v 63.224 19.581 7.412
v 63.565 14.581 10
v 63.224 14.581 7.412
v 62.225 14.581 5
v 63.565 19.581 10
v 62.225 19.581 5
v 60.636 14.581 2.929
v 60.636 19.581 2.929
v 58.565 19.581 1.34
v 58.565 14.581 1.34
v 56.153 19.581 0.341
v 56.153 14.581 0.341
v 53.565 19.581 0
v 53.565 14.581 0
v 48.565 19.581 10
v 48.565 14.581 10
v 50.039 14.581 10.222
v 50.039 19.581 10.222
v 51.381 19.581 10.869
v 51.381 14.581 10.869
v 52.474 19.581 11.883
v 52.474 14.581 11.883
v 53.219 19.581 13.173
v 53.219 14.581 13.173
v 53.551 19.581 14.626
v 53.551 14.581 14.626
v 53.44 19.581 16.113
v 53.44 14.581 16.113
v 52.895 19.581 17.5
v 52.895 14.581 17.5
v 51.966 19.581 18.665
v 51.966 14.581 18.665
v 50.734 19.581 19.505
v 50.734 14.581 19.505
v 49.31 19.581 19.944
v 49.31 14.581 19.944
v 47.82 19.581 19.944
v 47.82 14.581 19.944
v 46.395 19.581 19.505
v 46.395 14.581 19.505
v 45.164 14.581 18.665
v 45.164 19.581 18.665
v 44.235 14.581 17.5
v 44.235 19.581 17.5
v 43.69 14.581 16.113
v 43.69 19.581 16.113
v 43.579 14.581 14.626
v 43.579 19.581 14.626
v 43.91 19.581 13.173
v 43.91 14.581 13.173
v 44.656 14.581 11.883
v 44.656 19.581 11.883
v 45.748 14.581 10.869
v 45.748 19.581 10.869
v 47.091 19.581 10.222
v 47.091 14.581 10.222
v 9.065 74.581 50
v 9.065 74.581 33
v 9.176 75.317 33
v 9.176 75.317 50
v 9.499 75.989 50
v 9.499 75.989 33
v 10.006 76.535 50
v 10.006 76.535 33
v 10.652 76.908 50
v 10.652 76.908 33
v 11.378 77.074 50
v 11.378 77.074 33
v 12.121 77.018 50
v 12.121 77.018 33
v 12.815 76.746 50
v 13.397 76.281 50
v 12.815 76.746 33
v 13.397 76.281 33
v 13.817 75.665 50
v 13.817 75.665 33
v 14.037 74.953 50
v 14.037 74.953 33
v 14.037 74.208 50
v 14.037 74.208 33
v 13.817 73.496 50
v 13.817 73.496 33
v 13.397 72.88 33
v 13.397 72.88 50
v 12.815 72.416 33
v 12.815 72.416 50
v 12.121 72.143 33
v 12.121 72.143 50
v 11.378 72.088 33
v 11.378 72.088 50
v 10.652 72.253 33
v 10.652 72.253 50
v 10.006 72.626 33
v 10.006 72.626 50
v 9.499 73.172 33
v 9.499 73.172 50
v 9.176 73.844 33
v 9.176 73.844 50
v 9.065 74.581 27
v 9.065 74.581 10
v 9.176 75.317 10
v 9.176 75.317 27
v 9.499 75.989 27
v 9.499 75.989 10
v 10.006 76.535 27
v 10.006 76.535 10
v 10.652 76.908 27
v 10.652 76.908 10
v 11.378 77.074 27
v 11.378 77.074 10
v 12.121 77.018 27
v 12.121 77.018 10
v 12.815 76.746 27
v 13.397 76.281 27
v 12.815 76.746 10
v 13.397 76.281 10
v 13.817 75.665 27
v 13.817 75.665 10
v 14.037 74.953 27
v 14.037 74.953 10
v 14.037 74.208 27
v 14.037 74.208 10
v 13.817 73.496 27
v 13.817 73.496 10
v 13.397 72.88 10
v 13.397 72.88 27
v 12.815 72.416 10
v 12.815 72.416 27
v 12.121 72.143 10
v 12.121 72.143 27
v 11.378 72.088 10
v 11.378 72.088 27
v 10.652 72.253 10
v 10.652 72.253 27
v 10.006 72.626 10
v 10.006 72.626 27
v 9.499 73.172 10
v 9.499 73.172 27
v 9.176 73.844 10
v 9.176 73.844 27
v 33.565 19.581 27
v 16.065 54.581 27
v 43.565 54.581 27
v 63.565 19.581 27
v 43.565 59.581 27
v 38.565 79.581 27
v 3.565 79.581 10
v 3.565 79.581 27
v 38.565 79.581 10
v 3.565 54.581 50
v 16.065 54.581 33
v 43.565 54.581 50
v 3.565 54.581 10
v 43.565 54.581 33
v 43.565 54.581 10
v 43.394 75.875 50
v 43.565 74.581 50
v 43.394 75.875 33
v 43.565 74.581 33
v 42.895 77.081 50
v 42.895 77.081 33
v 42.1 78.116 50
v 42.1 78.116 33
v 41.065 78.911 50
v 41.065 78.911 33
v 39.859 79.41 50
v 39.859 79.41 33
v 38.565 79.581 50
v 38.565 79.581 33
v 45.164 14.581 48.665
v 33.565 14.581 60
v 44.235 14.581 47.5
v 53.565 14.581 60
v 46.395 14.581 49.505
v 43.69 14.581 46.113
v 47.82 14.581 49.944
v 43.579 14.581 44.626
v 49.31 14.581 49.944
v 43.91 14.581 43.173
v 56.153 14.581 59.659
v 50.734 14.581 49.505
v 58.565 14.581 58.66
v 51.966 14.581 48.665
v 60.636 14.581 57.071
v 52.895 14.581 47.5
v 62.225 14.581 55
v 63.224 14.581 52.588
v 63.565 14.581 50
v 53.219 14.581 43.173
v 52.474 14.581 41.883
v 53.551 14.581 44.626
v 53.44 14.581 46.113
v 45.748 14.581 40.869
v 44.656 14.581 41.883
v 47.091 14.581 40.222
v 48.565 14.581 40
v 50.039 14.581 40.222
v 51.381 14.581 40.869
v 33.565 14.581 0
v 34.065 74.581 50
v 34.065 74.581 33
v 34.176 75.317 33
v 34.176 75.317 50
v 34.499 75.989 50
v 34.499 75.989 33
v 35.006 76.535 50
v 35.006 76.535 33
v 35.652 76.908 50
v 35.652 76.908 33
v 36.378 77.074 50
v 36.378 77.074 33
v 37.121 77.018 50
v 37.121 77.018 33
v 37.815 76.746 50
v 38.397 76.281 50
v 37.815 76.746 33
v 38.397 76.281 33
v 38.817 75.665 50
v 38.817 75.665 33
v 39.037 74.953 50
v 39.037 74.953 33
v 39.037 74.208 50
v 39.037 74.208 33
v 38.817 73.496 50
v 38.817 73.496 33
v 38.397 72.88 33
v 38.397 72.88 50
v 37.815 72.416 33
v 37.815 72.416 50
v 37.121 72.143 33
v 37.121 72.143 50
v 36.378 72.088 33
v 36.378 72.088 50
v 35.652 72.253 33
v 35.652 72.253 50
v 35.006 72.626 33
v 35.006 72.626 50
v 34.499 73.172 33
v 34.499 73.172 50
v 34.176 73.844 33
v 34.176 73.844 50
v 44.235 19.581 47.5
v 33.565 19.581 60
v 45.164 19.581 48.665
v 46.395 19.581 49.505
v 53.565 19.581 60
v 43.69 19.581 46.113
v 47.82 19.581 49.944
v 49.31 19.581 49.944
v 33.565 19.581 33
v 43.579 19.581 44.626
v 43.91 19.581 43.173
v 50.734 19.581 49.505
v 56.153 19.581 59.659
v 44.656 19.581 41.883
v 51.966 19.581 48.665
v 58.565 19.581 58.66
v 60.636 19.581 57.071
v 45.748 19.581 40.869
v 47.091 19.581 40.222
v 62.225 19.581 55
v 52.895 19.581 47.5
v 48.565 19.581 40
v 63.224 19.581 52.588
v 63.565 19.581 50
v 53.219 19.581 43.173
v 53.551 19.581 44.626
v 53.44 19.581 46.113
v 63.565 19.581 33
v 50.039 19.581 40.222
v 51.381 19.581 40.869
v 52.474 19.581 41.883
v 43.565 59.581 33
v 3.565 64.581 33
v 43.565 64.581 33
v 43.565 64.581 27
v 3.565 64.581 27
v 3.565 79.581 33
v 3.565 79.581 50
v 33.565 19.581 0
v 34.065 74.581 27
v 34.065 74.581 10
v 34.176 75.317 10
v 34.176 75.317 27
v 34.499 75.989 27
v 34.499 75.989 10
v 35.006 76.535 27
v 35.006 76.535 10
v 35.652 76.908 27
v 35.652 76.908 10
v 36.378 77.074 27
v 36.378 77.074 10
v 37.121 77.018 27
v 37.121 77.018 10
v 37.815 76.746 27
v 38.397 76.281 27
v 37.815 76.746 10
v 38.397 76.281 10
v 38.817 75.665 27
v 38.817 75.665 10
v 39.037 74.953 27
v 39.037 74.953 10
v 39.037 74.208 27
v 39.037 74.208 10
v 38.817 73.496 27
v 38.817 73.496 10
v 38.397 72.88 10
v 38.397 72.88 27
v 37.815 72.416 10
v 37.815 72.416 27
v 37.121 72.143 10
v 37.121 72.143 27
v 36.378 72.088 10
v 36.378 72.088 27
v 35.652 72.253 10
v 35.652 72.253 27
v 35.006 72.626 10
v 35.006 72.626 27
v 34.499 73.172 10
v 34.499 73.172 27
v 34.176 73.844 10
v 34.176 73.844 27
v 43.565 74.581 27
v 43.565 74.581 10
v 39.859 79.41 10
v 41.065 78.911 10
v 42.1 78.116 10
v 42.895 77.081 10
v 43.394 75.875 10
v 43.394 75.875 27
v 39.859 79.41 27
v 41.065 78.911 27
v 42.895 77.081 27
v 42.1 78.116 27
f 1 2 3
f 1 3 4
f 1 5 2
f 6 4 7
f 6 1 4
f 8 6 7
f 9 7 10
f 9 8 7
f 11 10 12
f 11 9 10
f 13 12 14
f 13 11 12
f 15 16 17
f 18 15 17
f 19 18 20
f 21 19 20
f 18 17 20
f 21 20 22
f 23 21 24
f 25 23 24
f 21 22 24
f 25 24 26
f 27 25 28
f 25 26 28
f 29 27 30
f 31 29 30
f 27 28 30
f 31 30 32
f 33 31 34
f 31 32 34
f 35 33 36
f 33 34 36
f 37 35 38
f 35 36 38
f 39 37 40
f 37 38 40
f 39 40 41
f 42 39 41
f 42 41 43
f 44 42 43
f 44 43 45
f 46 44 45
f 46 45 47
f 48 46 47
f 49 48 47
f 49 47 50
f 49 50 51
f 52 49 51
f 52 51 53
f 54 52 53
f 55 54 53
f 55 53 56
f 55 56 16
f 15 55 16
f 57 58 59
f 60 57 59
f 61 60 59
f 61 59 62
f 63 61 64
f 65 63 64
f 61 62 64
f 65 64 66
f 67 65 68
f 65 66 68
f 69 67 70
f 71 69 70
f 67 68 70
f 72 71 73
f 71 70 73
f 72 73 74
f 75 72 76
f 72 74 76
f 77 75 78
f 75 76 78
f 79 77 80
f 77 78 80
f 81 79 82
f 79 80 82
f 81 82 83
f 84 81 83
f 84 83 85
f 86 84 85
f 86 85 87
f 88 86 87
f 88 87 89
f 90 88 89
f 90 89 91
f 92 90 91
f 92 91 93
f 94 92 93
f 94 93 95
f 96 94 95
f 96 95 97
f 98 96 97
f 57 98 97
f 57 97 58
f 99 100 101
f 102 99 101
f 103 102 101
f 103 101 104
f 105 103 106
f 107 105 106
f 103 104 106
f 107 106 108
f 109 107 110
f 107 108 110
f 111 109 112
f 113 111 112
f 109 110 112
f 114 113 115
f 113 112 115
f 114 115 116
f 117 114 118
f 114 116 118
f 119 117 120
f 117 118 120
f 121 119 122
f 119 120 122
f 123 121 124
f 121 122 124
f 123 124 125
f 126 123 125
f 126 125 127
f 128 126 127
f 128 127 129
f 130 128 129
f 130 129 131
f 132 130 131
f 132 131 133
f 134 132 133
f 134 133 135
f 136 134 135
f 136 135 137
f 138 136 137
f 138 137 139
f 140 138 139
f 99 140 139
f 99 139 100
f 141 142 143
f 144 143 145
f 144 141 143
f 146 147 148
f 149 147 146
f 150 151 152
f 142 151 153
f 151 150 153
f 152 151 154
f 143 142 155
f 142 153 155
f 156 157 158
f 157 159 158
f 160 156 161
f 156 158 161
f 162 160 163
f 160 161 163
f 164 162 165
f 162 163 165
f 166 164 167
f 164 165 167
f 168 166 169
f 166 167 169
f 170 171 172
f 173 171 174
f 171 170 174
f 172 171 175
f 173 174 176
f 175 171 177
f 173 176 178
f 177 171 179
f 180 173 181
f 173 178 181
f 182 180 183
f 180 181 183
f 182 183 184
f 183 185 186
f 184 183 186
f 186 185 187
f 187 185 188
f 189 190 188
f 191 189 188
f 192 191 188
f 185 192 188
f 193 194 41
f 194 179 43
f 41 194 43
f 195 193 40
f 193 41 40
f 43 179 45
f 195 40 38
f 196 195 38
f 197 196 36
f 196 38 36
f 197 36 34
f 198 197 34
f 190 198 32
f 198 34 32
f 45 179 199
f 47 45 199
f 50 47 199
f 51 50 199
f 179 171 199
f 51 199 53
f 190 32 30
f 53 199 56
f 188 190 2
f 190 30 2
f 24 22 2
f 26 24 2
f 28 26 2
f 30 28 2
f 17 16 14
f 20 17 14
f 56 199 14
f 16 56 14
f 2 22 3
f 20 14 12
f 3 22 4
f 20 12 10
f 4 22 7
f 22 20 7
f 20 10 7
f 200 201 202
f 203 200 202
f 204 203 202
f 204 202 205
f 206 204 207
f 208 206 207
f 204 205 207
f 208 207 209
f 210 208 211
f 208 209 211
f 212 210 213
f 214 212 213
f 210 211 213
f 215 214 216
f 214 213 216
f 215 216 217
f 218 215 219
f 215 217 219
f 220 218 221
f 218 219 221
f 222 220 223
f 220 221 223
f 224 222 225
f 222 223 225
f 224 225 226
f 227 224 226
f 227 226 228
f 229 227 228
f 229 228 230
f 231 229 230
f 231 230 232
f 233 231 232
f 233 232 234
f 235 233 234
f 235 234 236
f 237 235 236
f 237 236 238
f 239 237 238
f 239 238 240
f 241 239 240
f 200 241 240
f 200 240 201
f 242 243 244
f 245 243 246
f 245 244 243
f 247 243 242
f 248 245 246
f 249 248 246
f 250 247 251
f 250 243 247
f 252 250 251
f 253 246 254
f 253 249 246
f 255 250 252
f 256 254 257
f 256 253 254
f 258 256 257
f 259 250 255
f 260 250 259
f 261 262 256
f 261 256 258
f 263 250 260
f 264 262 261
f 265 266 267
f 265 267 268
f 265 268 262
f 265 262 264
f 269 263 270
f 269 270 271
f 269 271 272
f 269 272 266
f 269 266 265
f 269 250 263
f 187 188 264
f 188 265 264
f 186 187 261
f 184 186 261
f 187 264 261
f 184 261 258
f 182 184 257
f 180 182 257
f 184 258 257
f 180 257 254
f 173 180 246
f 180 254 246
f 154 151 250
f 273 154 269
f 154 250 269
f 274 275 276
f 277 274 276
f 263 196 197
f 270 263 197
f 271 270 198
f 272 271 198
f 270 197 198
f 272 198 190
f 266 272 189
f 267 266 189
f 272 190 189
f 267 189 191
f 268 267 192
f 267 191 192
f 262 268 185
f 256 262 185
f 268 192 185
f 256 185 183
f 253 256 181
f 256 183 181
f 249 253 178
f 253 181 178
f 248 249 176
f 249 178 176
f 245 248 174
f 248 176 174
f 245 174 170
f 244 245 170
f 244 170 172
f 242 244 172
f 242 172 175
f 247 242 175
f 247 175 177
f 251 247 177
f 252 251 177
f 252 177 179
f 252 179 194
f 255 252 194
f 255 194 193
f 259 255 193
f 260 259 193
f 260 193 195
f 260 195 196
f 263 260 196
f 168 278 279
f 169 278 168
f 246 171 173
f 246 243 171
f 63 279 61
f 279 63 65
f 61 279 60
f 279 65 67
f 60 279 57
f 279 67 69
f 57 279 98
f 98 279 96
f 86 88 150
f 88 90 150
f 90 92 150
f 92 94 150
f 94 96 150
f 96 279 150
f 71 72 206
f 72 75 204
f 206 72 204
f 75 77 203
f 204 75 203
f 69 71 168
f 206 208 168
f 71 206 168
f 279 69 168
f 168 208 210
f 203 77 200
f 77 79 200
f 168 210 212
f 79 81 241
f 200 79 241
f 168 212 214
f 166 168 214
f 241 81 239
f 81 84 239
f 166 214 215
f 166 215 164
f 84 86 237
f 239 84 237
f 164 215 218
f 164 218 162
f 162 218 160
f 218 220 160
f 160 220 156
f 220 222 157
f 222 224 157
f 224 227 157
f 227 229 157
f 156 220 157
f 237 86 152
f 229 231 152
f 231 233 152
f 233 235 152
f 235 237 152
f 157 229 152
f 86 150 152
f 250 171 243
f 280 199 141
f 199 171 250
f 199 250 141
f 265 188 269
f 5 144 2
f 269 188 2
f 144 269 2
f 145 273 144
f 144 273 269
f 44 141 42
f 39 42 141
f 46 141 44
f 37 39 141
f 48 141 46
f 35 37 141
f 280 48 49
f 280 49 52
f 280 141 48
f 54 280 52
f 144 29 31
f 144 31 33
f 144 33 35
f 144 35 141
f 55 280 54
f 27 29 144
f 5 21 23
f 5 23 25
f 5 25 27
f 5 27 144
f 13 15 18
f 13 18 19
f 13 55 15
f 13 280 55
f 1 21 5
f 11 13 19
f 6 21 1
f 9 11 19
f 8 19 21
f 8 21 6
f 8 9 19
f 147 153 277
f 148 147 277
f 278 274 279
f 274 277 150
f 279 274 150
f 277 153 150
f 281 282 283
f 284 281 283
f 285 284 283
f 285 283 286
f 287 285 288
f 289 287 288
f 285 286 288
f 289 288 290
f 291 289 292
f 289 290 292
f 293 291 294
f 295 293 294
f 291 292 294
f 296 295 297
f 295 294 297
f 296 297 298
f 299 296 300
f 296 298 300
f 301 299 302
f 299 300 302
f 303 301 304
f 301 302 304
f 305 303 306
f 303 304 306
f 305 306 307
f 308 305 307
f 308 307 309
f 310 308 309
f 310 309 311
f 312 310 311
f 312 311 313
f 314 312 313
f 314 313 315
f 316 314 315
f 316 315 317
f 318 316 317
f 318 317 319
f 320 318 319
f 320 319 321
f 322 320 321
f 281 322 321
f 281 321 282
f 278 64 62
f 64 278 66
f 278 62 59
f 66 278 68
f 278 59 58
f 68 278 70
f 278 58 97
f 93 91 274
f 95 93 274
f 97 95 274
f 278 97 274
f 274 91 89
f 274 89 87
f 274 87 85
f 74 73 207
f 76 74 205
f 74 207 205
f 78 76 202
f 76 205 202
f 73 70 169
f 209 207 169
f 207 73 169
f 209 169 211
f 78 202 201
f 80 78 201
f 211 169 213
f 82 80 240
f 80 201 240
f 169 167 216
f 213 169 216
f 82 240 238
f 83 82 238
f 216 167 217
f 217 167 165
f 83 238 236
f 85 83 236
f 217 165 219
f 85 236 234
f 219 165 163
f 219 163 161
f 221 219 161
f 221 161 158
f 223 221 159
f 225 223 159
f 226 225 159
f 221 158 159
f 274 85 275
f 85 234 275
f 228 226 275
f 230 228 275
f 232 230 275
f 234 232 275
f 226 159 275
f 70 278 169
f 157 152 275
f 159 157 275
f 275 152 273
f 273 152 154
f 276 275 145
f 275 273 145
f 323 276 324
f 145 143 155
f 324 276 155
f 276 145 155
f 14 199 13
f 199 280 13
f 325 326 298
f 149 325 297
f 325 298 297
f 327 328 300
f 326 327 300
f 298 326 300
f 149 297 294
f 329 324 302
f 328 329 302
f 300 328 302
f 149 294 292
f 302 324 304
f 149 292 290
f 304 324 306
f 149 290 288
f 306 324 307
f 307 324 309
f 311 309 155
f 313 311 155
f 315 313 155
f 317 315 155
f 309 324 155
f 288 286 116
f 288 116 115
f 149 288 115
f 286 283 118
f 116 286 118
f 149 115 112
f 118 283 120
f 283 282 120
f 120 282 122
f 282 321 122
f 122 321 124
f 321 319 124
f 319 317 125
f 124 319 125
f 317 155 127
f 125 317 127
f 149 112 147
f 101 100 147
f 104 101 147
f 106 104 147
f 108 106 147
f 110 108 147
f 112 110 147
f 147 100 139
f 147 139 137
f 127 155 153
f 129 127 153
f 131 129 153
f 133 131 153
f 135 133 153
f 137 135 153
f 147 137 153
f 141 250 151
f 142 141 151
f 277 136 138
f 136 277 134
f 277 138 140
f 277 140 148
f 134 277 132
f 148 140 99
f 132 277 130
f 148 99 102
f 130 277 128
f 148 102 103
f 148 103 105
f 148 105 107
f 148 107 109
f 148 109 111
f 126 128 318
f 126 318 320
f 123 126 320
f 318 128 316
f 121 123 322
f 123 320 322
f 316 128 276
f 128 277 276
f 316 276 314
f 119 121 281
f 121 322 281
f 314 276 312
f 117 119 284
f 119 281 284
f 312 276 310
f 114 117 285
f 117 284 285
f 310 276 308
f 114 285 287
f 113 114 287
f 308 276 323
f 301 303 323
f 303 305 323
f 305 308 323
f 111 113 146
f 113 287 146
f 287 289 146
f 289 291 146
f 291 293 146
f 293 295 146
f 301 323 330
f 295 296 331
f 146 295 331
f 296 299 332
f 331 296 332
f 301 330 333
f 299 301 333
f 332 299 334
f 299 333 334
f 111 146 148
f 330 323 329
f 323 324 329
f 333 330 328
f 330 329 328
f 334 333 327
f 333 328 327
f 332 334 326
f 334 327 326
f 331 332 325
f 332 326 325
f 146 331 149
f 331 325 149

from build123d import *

# Parameters (mm, degrees)
SKETCH1_W                  = 30
SKETCH1_H                  = 5
BOSS_EXTRUDE1_DEPTH        = 60
FILLET1_R                  = 10
F_10_0_10_DIAMETER_HOLE1_D = 10
SKETCH4_W                  = 50
SKETCH4_H                  = 6
BOSS_EXTRUDE4_DEPTH        = 40
CUT_EXTRUDE3_DEPTH         = 40
BOSS_EXTRUDE5_DEPTH        = 20
BOSS_EXTRUDE5_DEPTH_BACK   = 5
F_5_0_5_DIAMETER_HOLE1_D   = 5
CUT_EXTRUDE4_DEPTH         = 108.392141664
FILLET2_R                  = 5
FILLET3_R                  = 5


with BuildPart() as part:
    # Sketch1 → Boss-Extrude1 (new body)
    with BuildSketch(Plane.XY):
        with Locations((48.564868256, 17.080601224)):
            Rectangle(SKETCH1_W, SKETCH1_H)
    extrude(amount=BOSS_EXTRUDE1_DEPTH)

    # Fillet1
    fillet1_edges = [part.edges().sort_by_distance(p)[0] for p in [
        (63.564868256, 17.080601224, 60),
        (63.564868256, 17.080601224, 0),
    ]]
    fillet(fillet1_edges, radius=FILLET1_R)

    # Ø10.0 (10) Diameter Hole1 (through all)
    with Locations(Plane(origin=(48.564868256, 19.580601224, 15), x_dir=(0, 0, 1), z_dir=(0, 1, 0))):
        with Locations((0, 0), (30, 0)):
            Hole(F_10_0_10_DIAMETER_HOLE1_D / 2)

    # Sketch4 → Boss-Extrude4 (add)
    with BuildSketch(Plane(origin=(0, 19.580601224, 0), x_dir=(1, 0, 0), z_dir=(0, 1, 0))):
        with Locations((38.564868256, -30)):
            Rectangle(SKETCH4_W, SKETCH4_H)
    extrude(amount=BOSS_EXTRUDE4_DEPTH)

    # Sketch10 → Cut-Extrude3 (cut)
    with BuildSketch(Plane.XY.offset(33)):
        Polygon((33.564868256, 19.580601224), (13.564868256, 59.580601224), (13.564868256, 19.580601224), align=None)
        Polygon((63.564868256, 59.580601224), (43.564868256, 59.580601224), (63.564868256, 19.580601224), align=None)
    extrude(amount=-CUT_EXTRUDE3_DEPTH, mode=Mode.SUBTRACT)

    # Sketch11 → Boss-Extrude5 (add, two sides: drawn at the far end of the back side and taken through both)
    with BuildSketch(Plane(origin=(0, 59.580601224, 0), x_dir=(1, 0, 0), z_dir=(0, 1, 0)).offset(-BOSS_EXTRUDE5_DEPTH_BACK)):
        Polygon((43.564868256, -30), (43.564868256, -10), (3.564868256, -10), (3.564868256, -50), (43.564868256, -50), align=None)
    extrude(amount=BOSS_EXTRUDE5_DEPTH + BOSS_EXTRUDE5_DEPTH_BACK)

    # Ø5.0 (5) Diameter Hole1 (through all)
    with Locations(Plane(origin=(36.564868256, 74.580601224, 50), x_dir=(1, 0, 0), z_dir=(0, 0, 1))):
        with Locations((0, 0), (-25, 0)):
            Hole(F_5_0_5_DIAMETER_HOLE1_D / 2)

    # Sketch15 → Cut-Extrude4 (cut, through all)
    with BuildSketch(Plane(origin=(43.564868256, 0, 0), x_dir=(0, 0, -1), z_dir=(1, 0, 0))):
        Polygon((-30, 64.580601224), (-27, 64.580601224), (-27, 79.580601224), (-33, 79.580601224), (-33, 64.580601224), align=None)
    extrude(amount=-CUT_EXTRUDE4_DEPTH, mode=Mode.SUBTRACT)

    # Fillet2
    fillet2_edges = [part.edges().sort_by_distance(p)[0] for p in [
        (43.564868256, 79.580601224, 41.5),
    ]]
    fillet(fillet2_edges, radius=FILLET2_R)

    # Fillet3
    fillet3_edges = [part.edges().sort_by_distance(p)[0] for p in [
        (43.564868256, 79.580601224, 18.5),
    ]]
    fillet(fillet3_edges, radius=FILLET3_R)


solid = part.part
